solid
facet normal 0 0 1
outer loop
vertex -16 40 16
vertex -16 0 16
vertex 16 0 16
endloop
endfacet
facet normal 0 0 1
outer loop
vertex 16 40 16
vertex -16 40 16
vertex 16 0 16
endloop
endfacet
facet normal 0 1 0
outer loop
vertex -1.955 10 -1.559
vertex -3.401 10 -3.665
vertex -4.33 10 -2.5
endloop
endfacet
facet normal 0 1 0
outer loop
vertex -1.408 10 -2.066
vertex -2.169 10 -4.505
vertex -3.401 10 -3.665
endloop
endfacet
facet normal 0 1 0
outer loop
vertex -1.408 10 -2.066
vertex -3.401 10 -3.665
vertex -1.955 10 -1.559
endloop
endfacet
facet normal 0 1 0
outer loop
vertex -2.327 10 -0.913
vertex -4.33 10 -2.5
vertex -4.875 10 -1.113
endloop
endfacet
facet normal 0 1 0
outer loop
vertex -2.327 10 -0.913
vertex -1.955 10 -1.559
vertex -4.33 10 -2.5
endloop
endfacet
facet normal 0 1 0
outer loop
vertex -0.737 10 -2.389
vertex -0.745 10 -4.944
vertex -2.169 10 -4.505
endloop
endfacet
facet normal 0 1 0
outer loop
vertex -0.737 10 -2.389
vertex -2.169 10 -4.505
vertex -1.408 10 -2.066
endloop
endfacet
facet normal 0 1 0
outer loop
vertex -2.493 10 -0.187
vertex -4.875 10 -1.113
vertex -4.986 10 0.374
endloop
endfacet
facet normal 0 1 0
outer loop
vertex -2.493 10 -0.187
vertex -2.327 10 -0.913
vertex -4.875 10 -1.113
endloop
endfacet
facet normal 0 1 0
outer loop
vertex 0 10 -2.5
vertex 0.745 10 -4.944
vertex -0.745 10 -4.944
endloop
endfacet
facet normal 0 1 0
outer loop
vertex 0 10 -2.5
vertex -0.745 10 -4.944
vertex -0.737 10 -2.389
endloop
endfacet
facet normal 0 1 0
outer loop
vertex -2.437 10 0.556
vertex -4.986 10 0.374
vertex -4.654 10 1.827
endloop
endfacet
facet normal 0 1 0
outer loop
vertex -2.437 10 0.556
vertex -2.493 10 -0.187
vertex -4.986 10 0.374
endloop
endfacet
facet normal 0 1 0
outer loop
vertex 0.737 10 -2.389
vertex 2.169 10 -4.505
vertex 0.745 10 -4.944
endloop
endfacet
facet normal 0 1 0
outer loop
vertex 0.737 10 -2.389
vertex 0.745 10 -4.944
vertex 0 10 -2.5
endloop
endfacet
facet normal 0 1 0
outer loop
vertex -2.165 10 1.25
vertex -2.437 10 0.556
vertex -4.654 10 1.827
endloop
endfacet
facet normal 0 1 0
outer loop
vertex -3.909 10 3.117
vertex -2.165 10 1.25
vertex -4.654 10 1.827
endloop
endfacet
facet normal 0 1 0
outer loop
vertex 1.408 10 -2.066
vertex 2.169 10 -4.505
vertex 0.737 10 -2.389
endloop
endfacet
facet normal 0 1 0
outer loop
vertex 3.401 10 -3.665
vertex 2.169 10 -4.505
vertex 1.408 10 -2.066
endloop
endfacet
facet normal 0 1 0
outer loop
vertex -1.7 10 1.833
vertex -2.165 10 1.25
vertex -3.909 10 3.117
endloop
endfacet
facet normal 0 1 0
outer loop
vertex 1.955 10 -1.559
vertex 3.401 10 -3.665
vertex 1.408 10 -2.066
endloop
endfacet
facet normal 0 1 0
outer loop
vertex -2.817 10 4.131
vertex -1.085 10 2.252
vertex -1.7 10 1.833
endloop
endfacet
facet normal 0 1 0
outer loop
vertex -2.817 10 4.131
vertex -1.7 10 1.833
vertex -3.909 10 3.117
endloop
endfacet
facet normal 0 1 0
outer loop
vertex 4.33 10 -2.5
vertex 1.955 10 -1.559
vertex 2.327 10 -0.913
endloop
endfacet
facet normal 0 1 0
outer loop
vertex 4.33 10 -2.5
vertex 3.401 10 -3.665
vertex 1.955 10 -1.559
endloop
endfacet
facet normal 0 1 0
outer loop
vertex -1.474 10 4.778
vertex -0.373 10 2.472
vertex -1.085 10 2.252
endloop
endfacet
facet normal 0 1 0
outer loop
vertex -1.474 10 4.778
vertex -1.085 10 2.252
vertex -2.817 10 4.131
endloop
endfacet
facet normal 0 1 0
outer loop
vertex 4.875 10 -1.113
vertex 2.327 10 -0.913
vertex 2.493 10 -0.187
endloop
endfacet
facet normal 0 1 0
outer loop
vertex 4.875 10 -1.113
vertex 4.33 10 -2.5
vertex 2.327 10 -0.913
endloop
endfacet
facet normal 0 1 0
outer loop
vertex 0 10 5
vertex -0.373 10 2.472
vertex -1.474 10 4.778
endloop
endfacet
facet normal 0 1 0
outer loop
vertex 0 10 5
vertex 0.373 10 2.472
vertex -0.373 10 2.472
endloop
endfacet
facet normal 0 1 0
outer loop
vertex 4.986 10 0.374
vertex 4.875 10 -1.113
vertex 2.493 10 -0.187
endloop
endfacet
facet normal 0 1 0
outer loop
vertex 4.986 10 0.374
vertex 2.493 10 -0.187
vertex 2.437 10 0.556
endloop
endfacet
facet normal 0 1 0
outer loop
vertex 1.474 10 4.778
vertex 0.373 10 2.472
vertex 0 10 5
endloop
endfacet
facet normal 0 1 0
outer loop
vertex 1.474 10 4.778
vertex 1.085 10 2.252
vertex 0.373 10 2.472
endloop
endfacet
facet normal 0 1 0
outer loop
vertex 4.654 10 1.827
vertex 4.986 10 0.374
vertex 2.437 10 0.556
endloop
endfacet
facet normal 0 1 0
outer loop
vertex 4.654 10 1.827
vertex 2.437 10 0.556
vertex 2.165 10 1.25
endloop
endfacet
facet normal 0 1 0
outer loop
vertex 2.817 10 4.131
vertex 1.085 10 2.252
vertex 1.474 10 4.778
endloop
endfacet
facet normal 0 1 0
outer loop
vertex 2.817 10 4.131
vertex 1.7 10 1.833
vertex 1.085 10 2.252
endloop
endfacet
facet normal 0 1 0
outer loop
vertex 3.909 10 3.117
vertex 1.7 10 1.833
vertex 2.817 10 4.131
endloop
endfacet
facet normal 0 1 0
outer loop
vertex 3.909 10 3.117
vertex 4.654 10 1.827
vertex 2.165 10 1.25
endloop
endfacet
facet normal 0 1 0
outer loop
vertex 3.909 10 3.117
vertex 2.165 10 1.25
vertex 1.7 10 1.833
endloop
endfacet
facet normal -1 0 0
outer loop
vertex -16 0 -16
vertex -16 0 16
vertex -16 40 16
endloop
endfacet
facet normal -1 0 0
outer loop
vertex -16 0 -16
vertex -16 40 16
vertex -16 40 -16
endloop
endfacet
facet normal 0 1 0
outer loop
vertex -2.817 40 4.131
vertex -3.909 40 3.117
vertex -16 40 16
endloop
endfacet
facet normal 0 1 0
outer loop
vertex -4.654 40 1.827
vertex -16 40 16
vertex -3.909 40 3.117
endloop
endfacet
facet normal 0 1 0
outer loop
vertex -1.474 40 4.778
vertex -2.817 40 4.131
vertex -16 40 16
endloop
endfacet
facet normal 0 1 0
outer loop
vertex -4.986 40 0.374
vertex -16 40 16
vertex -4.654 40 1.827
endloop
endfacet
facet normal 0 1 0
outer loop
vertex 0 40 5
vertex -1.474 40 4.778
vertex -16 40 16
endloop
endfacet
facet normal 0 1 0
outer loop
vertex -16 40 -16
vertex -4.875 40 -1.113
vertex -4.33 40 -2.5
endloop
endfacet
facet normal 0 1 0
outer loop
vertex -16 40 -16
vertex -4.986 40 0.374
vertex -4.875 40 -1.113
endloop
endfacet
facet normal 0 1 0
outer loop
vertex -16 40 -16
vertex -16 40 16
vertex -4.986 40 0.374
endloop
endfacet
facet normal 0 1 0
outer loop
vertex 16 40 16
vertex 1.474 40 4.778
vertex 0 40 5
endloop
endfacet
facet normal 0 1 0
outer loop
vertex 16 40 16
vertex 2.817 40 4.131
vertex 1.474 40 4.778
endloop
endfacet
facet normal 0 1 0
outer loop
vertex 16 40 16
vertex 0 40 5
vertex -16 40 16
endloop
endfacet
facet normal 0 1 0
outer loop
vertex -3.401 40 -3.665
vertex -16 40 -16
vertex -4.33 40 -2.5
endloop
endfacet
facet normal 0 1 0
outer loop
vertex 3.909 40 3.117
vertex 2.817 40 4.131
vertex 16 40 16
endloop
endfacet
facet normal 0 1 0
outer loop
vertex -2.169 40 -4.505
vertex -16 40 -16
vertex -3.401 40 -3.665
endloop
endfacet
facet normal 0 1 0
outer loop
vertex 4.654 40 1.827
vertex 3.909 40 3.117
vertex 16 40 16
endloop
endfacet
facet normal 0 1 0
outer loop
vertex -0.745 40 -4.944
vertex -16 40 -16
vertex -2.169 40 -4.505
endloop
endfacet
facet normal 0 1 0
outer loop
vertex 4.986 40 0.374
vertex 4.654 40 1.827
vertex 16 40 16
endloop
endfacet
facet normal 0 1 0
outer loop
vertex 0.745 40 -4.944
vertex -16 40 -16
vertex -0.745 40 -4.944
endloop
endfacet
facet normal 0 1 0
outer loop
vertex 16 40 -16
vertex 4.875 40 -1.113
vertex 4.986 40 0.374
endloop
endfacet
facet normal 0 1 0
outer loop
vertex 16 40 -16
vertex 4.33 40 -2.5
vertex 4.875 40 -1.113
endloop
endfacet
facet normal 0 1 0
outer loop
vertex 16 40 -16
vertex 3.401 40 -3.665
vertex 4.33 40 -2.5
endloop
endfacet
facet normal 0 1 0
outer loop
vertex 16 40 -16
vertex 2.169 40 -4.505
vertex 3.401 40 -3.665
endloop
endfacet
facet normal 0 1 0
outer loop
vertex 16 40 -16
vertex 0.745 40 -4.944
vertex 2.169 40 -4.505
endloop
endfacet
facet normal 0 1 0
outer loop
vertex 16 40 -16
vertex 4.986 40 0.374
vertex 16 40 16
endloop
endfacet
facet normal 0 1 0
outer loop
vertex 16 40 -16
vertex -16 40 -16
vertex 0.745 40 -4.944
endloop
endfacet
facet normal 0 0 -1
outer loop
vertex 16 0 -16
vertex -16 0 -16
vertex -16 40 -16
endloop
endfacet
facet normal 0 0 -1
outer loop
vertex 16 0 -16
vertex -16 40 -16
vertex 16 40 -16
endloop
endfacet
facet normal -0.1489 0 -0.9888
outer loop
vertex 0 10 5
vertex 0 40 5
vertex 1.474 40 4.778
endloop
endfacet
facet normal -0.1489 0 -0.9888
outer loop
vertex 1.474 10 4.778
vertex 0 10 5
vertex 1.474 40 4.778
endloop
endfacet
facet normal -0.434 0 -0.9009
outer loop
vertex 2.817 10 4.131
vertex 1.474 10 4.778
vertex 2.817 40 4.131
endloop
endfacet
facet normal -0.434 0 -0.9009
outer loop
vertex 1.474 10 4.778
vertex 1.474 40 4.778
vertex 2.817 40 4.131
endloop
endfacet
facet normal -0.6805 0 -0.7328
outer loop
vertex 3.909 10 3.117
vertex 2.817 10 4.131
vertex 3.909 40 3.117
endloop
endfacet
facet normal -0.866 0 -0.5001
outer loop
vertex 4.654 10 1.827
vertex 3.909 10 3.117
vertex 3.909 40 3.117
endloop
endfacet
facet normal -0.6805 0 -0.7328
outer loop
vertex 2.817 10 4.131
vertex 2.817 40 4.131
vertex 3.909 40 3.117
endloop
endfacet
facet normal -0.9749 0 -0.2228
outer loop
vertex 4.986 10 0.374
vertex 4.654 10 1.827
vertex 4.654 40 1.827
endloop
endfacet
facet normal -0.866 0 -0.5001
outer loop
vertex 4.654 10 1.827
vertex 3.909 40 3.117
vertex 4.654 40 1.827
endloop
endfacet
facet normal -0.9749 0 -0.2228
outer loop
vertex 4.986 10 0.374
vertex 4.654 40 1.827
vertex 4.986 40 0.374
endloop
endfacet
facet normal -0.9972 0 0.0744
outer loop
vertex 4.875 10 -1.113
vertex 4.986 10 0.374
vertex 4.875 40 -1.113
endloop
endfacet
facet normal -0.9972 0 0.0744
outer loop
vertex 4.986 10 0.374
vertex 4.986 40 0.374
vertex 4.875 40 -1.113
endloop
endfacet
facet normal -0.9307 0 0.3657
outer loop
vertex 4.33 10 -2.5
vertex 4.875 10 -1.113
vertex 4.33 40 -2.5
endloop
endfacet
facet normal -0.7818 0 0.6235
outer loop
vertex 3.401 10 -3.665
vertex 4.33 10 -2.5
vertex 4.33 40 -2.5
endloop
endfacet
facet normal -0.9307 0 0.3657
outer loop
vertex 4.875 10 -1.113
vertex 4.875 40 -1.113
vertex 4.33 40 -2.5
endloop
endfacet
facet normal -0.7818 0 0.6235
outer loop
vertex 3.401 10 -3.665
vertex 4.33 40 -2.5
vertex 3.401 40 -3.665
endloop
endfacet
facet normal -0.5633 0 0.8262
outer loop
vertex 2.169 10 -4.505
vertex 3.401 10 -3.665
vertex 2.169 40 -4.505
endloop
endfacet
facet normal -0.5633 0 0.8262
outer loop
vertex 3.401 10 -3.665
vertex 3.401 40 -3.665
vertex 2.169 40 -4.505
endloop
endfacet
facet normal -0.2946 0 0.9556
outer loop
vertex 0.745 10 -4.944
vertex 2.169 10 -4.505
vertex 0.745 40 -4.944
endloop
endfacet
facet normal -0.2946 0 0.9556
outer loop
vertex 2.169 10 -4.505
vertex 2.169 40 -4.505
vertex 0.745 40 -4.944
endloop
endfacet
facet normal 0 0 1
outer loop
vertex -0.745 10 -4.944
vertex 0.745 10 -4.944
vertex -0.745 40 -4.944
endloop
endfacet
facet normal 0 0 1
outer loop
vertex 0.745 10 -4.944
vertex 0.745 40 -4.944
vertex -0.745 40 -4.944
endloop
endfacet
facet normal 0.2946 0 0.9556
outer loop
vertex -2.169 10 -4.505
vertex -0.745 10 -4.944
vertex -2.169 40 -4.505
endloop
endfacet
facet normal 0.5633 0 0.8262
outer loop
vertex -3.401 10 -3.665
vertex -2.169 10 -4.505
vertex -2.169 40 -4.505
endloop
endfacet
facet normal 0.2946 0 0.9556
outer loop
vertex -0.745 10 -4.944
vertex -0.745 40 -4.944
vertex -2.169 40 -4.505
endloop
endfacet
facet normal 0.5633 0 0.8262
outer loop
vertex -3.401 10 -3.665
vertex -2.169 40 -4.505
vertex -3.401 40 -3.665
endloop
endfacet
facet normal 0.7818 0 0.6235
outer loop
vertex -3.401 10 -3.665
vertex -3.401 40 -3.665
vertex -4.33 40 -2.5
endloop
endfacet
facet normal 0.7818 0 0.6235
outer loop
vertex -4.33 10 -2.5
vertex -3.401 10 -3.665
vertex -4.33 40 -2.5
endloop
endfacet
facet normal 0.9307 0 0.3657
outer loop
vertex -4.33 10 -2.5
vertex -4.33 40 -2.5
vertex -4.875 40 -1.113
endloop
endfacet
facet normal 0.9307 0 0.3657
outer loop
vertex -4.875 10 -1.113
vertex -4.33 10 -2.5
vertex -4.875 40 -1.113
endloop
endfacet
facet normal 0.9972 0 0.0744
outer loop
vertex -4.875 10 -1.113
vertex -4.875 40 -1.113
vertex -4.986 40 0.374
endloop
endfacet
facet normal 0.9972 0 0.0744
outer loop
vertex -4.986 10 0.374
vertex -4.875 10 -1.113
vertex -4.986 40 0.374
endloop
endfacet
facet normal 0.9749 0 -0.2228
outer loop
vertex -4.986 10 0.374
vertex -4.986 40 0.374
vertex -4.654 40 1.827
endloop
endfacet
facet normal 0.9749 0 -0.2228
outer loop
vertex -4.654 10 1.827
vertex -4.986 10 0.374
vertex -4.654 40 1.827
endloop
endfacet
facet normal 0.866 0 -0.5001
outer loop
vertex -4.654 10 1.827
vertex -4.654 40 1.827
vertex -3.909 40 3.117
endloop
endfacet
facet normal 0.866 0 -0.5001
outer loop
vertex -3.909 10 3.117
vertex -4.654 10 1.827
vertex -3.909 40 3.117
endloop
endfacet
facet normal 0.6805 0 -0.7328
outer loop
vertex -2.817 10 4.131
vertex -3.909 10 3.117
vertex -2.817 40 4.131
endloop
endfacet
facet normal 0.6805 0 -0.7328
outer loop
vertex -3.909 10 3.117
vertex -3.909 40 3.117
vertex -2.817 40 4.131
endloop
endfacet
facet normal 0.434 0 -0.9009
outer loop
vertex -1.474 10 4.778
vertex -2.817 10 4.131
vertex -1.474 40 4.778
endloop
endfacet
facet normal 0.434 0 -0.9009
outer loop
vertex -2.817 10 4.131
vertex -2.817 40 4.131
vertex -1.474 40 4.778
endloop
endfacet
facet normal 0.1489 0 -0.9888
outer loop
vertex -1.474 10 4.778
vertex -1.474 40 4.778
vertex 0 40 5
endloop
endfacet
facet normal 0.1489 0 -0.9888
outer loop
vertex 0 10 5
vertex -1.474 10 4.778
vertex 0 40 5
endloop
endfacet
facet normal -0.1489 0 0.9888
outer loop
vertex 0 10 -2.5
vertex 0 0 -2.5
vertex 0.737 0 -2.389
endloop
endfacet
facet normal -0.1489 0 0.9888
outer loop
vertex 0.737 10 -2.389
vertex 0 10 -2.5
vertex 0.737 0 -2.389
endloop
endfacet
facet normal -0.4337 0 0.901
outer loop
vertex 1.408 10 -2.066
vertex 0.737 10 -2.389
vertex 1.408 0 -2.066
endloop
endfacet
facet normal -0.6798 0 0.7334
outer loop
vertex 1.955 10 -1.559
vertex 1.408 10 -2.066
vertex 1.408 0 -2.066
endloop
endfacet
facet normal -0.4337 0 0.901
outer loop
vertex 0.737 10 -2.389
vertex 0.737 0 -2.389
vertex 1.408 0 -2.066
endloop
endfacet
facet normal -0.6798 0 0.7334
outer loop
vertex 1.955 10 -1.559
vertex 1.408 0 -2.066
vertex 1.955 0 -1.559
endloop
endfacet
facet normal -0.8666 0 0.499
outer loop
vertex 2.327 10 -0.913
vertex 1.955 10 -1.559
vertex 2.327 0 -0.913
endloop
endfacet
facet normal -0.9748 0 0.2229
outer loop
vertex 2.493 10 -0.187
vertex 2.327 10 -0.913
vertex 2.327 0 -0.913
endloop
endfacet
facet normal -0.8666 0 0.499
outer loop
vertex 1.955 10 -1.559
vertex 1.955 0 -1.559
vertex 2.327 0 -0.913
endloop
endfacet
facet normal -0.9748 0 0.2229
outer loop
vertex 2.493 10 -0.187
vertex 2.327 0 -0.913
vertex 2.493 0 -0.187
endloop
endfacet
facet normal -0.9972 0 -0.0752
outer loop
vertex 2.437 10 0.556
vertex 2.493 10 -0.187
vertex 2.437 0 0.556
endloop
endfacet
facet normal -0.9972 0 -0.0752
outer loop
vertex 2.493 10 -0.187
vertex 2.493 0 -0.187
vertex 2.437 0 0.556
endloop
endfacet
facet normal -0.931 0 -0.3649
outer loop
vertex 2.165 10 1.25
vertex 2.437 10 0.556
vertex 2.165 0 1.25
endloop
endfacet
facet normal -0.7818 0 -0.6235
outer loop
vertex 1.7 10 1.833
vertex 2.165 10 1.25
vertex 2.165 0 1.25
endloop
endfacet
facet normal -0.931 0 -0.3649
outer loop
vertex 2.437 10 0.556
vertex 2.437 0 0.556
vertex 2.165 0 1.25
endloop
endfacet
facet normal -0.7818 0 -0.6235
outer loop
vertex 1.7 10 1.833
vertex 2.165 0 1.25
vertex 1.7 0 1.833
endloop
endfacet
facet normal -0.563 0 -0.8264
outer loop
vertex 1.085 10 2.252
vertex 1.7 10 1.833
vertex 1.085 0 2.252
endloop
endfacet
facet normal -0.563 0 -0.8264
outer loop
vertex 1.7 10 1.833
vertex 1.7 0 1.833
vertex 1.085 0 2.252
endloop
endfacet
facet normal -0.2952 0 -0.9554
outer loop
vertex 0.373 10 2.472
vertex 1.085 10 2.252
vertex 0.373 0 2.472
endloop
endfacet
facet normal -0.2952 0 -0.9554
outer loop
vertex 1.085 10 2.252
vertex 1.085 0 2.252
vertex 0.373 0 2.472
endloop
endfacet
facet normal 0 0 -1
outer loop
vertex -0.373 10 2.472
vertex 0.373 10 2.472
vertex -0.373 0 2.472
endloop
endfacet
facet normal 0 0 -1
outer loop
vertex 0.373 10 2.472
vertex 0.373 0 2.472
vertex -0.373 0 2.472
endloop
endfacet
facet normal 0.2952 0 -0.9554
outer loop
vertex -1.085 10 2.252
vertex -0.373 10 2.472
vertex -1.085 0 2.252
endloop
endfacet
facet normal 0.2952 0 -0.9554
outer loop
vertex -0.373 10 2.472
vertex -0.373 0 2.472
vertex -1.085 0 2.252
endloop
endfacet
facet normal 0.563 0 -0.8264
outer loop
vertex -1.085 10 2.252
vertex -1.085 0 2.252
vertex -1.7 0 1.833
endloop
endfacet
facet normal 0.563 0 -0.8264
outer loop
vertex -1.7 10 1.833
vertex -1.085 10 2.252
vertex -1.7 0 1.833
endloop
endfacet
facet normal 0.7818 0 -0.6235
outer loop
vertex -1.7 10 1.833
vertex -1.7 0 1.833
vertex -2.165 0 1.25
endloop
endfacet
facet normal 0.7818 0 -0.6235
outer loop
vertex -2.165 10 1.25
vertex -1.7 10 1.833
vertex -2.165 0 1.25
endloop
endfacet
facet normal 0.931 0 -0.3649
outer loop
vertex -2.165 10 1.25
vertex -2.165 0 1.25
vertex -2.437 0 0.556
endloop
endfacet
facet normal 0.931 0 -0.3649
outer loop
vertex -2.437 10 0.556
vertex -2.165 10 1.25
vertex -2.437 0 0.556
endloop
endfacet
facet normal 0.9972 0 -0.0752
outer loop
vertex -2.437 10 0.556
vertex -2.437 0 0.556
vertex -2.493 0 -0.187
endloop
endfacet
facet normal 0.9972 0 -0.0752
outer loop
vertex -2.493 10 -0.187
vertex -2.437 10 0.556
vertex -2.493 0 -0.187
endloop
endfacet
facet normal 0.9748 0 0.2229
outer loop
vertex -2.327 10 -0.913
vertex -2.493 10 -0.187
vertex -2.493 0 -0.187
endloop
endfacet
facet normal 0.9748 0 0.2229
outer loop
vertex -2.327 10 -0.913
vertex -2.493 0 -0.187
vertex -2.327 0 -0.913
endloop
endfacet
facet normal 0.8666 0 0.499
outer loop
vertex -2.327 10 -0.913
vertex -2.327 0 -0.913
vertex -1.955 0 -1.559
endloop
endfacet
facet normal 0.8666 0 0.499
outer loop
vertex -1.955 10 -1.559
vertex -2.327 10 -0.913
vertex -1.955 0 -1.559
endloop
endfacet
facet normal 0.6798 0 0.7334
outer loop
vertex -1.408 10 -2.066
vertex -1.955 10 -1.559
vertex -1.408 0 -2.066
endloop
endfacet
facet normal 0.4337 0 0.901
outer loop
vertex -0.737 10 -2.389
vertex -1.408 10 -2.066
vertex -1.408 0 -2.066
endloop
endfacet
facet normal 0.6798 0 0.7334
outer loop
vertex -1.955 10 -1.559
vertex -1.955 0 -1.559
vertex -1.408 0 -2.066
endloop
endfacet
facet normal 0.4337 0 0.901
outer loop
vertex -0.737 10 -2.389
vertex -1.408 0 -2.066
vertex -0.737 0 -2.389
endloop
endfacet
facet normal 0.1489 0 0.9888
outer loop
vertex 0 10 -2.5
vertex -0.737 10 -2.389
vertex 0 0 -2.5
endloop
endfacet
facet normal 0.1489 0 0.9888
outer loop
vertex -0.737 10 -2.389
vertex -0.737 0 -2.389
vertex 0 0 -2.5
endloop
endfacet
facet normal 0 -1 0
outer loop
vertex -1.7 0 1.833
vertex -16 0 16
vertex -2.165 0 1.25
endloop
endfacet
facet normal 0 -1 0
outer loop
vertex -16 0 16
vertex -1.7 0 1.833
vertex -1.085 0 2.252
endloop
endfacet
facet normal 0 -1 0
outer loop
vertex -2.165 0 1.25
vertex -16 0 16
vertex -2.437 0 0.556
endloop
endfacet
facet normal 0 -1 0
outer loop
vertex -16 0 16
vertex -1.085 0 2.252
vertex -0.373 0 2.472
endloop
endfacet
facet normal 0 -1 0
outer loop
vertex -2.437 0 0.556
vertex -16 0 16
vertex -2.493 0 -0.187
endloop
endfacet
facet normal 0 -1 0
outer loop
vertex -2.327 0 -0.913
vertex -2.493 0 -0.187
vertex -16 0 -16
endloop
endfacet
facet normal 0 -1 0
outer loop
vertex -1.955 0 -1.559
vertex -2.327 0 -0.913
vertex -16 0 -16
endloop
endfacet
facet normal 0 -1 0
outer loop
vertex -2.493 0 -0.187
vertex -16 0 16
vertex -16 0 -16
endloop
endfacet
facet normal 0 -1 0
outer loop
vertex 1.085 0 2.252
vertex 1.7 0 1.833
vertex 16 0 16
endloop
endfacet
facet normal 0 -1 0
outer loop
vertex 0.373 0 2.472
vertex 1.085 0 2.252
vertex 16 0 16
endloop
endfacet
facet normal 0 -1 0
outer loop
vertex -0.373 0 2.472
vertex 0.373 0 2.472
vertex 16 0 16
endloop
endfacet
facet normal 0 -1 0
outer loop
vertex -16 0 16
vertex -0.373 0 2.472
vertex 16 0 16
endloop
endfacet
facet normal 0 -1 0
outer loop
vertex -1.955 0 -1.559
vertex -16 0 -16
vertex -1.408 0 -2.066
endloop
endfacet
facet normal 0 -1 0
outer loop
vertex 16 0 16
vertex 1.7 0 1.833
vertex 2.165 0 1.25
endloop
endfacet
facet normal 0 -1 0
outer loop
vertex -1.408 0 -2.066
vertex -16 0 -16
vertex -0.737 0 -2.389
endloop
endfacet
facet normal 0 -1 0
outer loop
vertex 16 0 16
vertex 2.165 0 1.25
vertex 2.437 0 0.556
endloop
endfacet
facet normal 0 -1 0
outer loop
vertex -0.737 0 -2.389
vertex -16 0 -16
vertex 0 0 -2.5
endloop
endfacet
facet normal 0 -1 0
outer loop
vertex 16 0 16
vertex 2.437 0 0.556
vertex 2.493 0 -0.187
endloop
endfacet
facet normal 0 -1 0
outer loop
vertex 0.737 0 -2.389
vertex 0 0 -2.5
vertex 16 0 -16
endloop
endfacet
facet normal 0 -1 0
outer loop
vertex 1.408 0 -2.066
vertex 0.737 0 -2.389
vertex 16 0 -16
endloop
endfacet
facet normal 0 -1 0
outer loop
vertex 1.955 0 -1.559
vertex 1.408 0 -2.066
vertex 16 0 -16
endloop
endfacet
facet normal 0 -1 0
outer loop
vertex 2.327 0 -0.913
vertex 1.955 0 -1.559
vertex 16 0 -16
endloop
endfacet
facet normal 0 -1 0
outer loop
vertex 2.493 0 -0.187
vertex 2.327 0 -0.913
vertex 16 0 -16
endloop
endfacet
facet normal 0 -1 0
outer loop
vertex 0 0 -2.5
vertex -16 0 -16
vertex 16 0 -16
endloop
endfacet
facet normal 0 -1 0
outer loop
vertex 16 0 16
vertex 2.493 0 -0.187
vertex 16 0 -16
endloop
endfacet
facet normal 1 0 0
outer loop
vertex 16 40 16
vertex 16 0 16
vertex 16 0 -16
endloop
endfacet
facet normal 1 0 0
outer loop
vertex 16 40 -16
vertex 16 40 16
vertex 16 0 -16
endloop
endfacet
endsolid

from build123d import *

# Parameters (mm, degrees)
SKETCH_1_R          = 6
EXTRUDE_1_DEPTH     = 40
SKETCH_2_R          = 5
CUT_EXTRUDE_2_DEPTH = 30
SKETCH_3_R          = 2.5
CUT_EXTRUDE_4_DEPTH = 10
SKETCH_5_R          = 16
SKETCH_5_R_2        = 6
EXTRUDE_1_2_DEPTH   = 40
SKETCH_6_W          = 32
SKETCH_6_H          = 32
SKETCH_6_W_2        = 12
SKETCH_6_H_2        = 12
EXTRUDE_2_DEPTH     = 40


with BuildPart() as part:
    # 草圖1 → Extrude 1 (new body)
    with BuildSketch(Plane(origin=(0, 0, 0), x_dir=(1, 0, 0), z_dir=(0, 1, 0))):
        with Locations(Location((0, 0, 0), (0, 0, 270))):
            Circle(SKETCH_1_R)
    extrude(amount=EXTRUDE_1_DEPTH)

    # 草圖2 → 除料-伸長2 (cut)
    with BuildSketch(Plane(origin=(0, 40, 0), x_dir=(1, 0, 0), z_dir=(0, 1, 0))):
        with Locations(Location((0, 0, 0), (0, 0, 270))):
            Circle(SKETCH_2_R)
    extrude(amount=-CUT_EXTRUDE_2_DEPTH, mode=Mode.SUBTRACT)

    # 草圖3 → 除料-伸長4 (cut)
    with BuildSketch(Plane.XZ):
        with Locations(Location((0, 0, 0), (0, 0, 270))):
            Circle(SKETCH_3_R)
    extrude(amount=-CUT_EXTRUDE_4_DEPTH, mode=Mode.SUBTRACT)

    # 草圖5 → Extrude 1 2 (add)
    with BuildSketch(Plane(origin=(0, 0, 0), x_dir=(1, 0, 0), z_dir=(0, 1, 0))):
        Circle(SKETCH_5_R)
        Circle(SKETCH_5_R_2, mode=Mode.SUBTRACT)
    extrude(amount=EXTRUDE_1_2_DEPTH)

    # 草圖6 → 伸長-薄件2 (add)
    with BuildSketch(Plane(origin=(0, 40, 0), x_dir=(1, 0, 0), z_dir=(0, 1, 0))):
        Rectangle(SKETCH_6_W, SKETCH_6_H)
        Rectangle(SKETCH_6_W_2, SKETCH_6_H_2, mode=Mode.SUBTRACT)
    extrude(amount=-EXTRUDE_2_DEPTH)


solid = part.part
